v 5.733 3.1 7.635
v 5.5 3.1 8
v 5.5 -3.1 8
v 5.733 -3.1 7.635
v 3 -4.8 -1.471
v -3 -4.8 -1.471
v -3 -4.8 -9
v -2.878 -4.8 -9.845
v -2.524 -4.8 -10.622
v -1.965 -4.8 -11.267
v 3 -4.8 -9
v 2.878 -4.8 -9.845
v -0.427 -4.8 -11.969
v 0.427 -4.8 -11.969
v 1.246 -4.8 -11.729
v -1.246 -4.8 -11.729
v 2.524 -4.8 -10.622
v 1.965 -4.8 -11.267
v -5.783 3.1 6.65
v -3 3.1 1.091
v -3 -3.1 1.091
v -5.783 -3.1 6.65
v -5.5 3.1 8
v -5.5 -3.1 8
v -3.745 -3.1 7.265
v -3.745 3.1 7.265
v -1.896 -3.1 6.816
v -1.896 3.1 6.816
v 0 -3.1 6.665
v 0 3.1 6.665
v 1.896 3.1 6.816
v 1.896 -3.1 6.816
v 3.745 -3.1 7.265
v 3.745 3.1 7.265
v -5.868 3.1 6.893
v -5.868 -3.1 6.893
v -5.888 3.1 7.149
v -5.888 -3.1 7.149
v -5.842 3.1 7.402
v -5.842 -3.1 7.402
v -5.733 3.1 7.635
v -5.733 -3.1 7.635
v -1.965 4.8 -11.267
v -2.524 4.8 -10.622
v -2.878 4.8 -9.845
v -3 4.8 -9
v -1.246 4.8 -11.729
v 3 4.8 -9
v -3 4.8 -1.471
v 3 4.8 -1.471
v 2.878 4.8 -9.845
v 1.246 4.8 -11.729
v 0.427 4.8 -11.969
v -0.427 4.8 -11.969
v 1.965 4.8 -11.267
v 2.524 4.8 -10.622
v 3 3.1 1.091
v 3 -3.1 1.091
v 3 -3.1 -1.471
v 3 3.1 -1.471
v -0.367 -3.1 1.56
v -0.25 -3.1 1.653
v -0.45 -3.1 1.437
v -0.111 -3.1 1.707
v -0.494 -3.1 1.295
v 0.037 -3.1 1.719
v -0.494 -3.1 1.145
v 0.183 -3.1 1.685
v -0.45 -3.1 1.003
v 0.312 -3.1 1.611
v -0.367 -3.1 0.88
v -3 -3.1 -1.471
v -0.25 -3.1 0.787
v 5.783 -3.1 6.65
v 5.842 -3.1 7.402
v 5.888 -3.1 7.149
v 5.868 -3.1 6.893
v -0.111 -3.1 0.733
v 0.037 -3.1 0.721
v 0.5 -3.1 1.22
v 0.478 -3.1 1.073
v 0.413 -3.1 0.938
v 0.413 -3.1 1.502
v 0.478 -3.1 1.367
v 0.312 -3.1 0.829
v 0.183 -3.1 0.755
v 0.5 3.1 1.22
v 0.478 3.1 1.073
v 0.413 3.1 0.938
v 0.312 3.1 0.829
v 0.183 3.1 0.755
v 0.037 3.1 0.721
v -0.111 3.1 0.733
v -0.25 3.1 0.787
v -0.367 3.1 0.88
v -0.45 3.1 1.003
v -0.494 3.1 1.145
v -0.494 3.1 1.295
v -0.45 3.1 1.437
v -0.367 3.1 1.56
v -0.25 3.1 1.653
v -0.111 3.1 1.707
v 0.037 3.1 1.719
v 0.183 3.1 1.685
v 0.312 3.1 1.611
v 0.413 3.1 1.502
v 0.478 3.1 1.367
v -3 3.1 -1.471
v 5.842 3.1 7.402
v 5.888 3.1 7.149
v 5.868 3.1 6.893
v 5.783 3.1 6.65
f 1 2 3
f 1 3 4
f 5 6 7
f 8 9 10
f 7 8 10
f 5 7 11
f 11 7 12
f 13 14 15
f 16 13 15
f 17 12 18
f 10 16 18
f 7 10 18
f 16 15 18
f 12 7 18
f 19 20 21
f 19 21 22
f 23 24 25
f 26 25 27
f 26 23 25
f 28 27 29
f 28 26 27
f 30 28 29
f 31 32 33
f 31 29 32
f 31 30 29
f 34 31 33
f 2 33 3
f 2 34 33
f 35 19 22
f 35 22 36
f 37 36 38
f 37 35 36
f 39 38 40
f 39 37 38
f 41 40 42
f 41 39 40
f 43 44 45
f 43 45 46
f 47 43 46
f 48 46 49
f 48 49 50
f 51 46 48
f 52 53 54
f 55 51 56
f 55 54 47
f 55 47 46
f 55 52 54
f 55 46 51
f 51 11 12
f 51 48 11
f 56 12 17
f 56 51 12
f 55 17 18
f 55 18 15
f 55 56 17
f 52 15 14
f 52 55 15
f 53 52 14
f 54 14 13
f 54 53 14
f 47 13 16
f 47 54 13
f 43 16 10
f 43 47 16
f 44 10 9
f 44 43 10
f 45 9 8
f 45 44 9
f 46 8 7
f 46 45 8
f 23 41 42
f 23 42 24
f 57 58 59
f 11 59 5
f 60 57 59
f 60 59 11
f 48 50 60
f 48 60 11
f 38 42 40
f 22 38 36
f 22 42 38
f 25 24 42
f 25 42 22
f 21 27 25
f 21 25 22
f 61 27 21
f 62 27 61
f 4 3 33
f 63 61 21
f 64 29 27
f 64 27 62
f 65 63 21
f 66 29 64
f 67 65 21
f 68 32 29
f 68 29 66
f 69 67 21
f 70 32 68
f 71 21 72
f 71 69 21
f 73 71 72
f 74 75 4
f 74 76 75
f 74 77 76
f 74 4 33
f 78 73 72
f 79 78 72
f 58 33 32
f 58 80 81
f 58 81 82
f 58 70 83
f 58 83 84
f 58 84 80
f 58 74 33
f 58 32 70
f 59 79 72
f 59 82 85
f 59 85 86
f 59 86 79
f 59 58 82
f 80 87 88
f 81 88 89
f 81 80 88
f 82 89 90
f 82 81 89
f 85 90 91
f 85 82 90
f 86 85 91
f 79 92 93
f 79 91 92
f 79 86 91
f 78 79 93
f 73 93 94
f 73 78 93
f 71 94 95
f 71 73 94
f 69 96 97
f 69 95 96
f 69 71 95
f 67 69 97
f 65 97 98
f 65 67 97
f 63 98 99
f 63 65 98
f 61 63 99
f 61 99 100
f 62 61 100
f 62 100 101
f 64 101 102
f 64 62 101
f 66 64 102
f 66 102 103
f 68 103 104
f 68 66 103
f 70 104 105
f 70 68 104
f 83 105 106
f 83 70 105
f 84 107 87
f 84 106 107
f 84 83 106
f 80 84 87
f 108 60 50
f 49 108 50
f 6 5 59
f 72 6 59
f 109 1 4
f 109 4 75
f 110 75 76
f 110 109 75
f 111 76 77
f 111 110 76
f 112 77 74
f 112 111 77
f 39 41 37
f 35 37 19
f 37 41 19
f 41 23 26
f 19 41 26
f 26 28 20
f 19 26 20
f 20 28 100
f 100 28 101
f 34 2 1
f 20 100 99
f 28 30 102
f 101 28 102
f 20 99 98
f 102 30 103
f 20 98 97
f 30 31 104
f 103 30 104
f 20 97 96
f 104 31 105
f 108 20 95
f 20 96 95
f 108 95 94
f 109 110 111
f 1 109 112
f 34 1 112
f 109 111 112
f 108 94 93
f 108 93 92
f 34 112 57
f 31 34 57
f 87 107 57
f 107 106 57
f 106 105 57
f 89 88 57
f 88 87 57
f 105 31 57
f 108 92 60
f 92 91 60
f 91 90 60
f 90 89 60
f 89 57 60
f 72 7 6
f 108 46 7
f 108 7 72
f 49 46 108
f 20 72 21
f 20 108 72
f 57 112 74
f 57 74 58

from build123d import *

# Parameters (mm, degrees)
SKETCH1_R               = 0.5
BOSS_EXTRUDE1_DEPTH     = 4.8
SKETCH3_W               = 11.720240581
SKETCH3_H               = 3.048700617
SKETCH3_W_2             = 11.288820682
SKETCH3_H_2             = 3.839637098
CUT_EXTRUDE1_DEPTH      = 6.889299393
CUT_EXTRUDE1_DEPTH_BACK = 6.889299393


with BuildPart() as part:
    # Sketch1 → Boss-Extrude1 (new body, symmetric)
    with BuildSketch(Plane(origin=(0, 0, 0), x_dir=(1, 0, 0), z_dir=(0, 1, 0))):
        with BuildLine():
            Line((-3, 9), (-3, -1.091261391))
            Line((-3, -1.091261391), (-5.78345363, -6.64968985))
            ThreePointArc((-5.78345363, -6.64968985), (-5.88797422, -7.148913405), (-5.732690839, -7.634748546))
            Line((-5.732690839, -7.634748546), (-5.5, -8))
            ThreePointArc((-5.5, -8), (0, -6.665364504), (5.5, -8))
            Line((5.5, -8), (5.732690839, -7.634748546))
            ThreePointArc((5.732690839, -7.634748546), (5.88797422, -7.148913405), (5.78345363, -6.64968985))
            Line((5.78345363, -6.64968985), (3, -1.091261391))
            Line((3, -1.091261391), (3, 9))
            ThreePointArc((3, 9), (0, 12), (-3, 9))
        make_face()
        with Locations((0, -1.22)):
            Circle(SKETCH1_R, mode=Mode.SUBTRACT)
    extrude(amount=BOSS_EXTRUDE1_DEPTH, both=True)

    # Sketch3 → Cut-Extrude1 (cut, two sides)
    with BuildSketch(Plane(origin=(0, 0, 0), x_dir=(0, 0, -1), z_dir=(1, 0, 0))) as cut_extrude1_sk:
        with Locations((-4.389443778, 4.624350309)):
            Rectangle(SKETCH3_W, SKETCH3_H)
        with Locations((-4.173733829, -5.019818549)):
            Rectangle(SKETCH3_W_2, SKETCH3_H_2)
    extrude(amount=CUT_EXTRUDE1_DEPTH, mode=Mode.SUBTRACT)
    extrude(cut_extrude1_sk.sketch, amount=-CUT_EXTRUDE1_DEPTH_BACK, mode=Mode.SUBTRACT)


solid = part.part
